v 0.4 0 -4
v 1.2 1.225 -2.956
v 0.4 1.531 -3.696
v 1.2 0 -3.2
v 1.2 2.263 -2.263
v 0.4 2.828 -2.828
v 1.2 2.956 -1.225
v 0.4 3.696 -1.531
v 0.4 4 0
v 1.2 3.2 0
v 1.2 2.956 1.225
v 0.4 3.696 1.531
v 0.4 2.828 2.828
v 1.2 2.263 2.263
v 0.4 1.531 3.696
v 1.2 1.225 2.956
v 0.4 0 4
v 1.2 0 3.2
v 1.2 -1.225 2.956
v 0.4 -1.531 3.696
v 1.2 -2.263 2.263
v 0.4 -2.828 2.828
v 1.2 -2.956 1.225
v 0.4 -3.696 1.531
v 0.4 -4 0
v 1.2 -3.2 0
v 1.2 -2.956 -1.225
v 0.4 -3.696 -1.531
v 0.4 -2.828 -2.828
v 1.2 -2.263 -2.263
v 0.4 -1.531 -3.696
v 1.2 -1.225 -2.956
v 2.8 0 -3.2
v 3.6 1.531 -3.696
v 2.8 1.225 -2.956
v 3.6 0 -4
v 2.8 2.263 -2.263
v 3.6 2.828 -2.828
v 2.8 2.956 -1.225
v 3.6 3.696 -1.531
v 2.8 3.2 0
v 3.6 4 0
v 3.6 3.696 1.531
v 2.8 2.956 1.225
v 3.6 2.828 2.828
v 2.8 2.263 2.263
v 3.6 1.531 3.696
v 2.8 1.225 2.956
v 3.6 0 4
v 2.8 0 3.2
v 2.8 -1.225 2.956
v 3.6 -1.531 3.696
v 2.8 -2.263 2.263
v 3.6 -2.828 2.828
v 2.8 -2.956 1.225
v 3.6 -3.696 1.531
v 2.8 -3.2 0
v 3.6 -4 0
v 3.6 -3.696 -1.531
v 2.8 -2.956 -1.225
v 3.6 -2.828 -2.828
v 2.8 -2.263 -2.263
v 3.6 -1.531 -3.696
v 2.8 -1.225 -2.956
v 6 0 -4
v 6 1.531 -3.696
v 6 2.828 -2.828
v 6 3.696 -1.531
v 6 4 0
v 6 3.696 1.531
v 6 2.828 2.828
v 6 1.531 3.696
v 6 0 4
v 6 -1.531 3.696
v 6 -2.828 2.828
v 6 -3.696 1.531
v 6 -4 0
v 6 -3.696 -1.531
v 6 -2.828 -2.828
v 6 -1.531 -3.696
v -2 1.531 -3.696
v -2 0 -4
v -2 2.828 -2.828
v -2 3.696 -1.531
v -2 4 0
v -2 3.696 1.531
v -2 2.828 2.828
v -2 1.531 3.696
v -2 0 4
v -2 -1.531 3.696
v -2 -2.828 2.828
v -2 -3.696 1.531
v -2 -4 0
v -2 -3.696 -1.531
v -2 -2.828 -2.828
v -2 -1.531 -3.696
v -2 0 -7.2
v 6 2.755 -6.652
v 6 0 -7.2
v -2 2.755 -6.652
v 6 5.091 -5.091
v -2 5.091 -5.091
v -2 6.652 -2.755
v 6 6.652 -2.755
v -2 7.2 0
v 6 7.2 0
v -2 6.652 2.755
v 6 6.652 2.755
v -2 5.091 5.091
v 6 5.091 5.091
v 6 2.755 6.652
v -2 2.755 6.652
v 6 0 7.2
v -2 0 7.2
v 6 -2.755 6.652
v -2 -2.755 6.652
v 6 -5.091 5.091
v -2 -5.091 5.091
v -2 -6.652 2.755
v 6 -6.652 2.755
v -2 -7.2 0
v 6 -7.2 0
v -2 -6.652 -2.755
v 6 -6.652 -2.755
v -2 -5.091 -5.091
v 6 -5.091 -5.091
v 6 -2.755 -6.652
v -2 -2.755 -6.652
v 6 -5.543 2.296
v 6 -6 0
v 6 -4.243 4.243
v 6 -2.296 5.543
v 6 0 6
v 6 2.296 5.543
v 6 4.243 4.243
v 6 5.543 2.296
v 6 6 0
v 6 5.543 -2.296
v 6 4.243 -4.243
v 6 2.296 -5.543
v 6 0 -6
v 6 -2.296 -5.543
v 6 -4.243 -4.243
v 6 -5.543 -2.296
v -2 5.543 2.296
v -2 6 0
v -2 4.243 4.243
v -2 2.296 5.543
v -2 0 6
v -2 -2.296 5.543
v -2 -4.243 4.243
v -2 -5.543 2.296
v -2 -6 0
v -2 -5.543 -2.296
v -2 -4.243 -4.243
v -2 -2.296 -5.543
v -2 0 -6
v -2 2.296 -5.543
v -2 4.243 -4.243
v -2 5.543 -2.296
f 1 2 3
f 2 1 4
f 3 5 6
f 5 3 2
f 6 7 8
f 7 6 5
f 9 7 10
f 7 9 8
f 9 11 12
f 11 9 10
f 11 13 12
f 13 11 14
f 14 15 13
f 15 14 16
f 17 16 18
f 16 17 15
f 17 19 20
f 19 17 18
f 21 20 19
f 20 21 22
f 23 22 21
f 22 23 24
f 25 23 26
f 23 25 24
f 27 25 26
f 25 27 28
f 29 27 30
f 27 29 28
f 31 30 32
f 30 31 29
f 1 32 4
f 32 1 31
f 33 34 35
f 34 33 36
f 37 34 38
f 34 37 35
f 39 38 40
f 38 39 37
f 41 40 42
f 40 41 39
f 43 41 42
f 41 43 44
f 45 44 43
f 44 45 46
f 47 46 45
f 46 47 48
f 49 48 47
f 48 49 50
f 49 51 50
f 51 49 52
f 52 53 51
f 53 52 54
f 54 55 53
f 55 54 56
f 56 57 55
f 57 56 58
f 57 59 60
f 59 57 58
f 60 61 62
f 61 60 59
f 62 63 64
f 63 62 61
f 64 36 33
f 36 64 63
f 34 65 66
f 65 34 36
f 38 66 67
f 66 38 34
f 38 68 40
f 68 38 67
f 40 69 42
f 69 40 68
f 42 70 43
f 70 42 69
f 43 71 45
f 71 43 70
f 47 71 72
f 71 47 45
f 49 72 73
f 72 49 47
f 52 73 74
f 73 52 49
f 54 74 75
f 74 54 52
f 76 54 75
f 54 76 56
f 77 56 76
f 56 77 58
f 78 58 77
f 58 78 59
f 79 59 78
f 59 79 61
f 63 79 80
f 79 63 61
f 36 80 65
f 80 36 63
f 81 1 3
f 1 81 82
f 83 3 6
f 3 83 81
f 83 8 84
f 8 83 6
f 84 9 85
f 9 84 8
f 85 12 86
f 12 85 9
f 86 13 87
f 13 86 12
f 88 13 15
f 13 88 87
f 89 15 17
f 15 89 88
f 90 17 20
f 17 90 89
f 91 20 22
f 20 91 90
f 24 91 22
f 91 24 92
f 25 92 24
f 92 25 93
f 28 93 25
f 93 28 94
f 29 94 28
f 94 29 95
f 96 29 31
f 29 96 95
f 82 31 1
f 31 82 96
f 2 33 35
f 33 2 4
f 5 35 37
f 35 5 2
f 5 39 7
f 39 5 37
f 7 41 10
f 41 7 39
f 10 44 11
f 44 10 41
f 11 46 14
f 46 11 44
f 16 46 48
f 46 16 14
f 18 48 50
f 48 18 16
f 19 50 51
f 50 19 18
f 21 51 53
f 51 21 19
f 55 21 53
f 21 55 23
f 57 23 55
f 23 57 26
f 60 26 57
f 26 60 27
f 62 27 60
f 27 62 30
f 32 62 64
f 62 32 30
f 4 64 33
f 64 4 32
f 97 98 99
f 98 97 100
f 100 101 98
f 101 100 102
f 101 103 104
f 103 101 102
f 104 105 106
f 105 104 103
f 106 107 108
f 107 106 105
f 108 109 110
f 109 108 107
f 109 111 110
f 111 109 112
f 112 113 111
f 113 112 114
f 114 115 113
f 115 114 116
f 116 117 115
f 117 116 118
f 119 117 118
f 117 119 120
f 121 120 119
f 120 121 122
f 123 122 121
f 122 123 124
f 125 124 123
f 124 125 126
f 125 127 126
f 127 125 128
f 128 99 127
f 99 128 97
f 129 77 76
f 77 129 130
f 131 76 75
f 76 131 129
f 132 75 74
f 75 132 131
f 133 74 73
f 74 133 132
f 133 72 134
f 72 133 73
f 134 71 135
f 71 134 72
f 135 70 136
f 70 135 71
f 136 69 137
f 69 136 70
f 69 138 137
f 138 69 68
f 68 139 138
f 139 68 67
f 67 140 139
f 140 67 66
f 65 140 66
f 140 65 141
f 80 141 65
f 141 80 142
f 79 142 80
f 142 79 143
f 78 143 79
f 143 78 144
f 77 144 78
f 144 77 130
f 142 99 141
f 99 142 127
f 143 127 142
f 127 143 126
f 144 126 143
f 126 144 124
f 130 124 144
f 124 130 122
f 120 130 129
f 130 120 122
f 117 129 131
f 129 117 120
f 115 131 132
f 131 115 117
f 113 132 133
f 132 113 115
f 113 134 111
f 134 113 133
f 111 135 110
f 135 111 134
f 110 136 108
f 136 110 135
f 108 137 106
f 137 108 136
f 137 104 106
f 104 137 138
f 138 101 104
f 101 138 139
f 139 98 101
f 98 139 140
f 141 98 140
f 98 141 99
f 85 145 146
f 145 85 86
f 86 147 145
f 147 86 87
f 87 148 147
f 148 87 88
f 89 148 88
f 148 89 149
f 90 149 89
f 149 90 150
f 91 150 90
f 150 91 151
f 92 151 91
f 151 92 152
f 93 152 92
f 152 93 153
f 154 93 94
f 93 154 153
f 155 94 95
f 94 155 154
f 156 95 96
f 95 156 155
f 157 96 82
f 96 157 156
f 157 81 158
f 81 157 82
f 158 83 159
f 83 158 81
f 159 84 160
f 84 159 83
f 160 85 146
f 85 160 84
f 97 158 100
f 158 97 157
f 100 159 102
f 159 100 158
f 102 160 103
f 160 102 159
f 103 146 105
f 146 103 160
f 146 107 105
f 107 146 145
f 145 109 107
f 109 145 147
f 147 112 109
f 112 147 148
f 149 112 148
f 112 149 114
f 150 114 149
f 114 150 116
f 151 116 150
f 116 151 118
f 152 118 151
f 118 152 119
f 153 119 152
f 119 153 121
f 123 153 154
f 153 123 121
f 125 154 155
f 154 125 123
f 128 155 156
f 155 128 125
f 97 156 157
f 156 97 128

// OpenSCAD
// file: ../p/4-4disc.scad
use <../lib.scad>
$fa=1; $fs=0.2;
function ldraw_lib__4_4disc(realsolid=false) = [
// 0 Disc 1.0
// 0 Name: 4-4disc.dat
// 0 Author: James Jessiman
// 0 !LDRAW_ORG Primitive UPDATE 2002-02
// 0 !LICENSE Licensed under CC BY 2.0 and CC BY 4.0 : see CAreadme.txt
// 
// 0 BFC CERTIFY CCW
  [0,"BFC","CERTIFY"],
  [0,"BFC","CCW"],
// 
// 0 !HISTORY 1998-12-15 [PTadmin] Official Update 1998-10
// 0 !HISTORY 2002-03-23 [sbliss] Added BFC statement
// 0 !HISTORY 2002-04-25 [PTadmin] Official Update 2002-02
// 0 !HISTORY 2007-06-24 [PTadmin] Header formatted for Contributor Agreement
// 0 !HISTORY 2008-07-01 [PTadmin] Official Update 2008-01
// 
// 
// 3 16 0 0 0 1 0 0 0.9239 0 0.3827
  [3,16,0,0,0,1,0,0,0.9239,0,0.3827],
// 3 16 0 0 0 0.9239 0 0.3827 0.7071 0 0.7071
  [3,16,0,0,0,0.9239,0,0.3827,0.7071,0,0.7071],
// 3 16 0 0 0 0.7071 0 0.7071 0.3827 0 0.9239
  [3,16,0,0,0,0.7071,0,0.7071,0.3827,0,0.9239],
// 3 16 0 0 0 0.3827 0 0.9239 0 0 1
  [3,16,0,0,0,0.3827,0,0.9239,0,0,1],
// 3 16 0 0 0 0 0 1 -0.3827 0 0.9239
  [3,16,0,0,0,0,0,1,-0.3827,0,0.9239],
// 3 16 0 0 0 -0.3827 0 0.9239 -0.7071 0 0.7071
  [3,16,0,0,0,-0.3827,0,0.9239,-0.7071,0,0.7071],
// 3 16 0 0 0 -0.7071 0 0.7071 -0.9239 0 0.3827
  [3,16,0,0,0,-0.7071,0,0.7071,-0.9239,0,0.3827],
// 3 16 0 0 0 -0.9239 0 0.3827 -1 0 -0
  [3,16,0,0,0,-0.9239,0,0.3827,-1,0,-0],
// 3 16 0 0 0 -1 0 -0 -0.9239 0 -0.3827
  [3,16,0,0,0,-1,0,-0,-0.9239,0,-0.3827],
// 3 16 0 0 0 -0.9239 0 -0.3827 -0.7071 0 -0.7071
  [3,16,0,0,0,-0.9239,0,-0.3827,-0.7071,0,-0.7071],
// 3 16 0 0 0 -0.7071 0 -0.7071 -0.3827 0 -0.9239
  [3,16,0,0,0,-0.7071,0,-0.7071,-0.3827,0,-0.9239],
// 3 16 0 0 0 -0.3827 0 -0.9239 0 0 -1
  [3,16,0,0,0,-0.3827,0,-0.9239,0,0,-1],
// 3 16 0 0 0 0 0 -1 0.3827 0 -0.9239
  [3,16,0,0,0,0,0,-1,0.3827,0,-0.9239],
// 3 16 0 0 0 0.3827 0 -0.9239 0.7071 0 -0.7071
  [3,16,0,0,0,0.3827,0,-0.9239,0.7071,0,-0.7071],
// 3 16 0 0 0 0.7071 0 -0.7071 0.9239 0 -0.3827
  [3,16,0,0,0,0.7071,0,-0.7071,0.9239,0,-0.3827],
// 3 16 0 0 0 0.9239 0 -0.3827 1 0 0
  [3,16,0,0,0,0.9239,0,-0.3827,1,0,0],
// 0
];
module ldraw_lib__4_4disc(step=0, col=false, unit=2/5, alt=false, line=0.2, solid=!$preview)
    makepoly(ldraw_lib__4_4disc(solid), step=step, col=col, unit=unit, alt=alt, line=line, solid=solid);
ldraw_lib__4_4disc(line=0.2);
// file: ../p/stud3.scad
use <../lib.scad>
use <4-4cyli.scad>
use <4-4disc.scad>
use <4-4edge.scad>
$fa=1; $fs=0.2;
function ldraw_lib__stud3(realsolid=false) = realsolid ? 
    [openscad(translate([0,0,-eps()], o=cylinder(4+eps(), r=4)),2)] : [
// 0 Stud Tube Solid
// 0 Name: stud3.dat
// 0 Author: James Jessiman
// 0 !LDRAW_ORG Primitive UPDATE 2012-01
// 0 !LICENSE Licensed under CC BY 2.0 and CC BY 4.0 : see CAreadme.txt
// 
// 0 BFC CERTIFY CCW
  [0,"BFC","CERTIFY"],
  [0,"BFC","CCW"],
// 
// 0 !HISTORY 2002-04-04 [sbliss] Modified for BFC compliance
// 0 !HISTORY 2002-04-25 [PTadmin] Official Update 2002-02
// 0 !HISTORY 2007-06-24 [PTadmin] Header formatted for Contributor Agreement
// 0 !HISTORY 2008-07-01 [PTadmin] Official Update 2008-01
// 0 !HISTORY 2012-02-16 [Philo] Changed to CCW
// 0 !HISTORY 2012-03-30 [PTadmin] Official Update 2012-01
// 
// 
// 1 16 0 -4 0 4 0 0 0 1 0 0 0 4 4-4edge.dat
  [1,16,0,-4,0,4,0,0,0,1,0,0,0,4, ldraw_lib__4_4edge(realsolid)],
// 1 16 0 0 0 4 0 0 0 1 0 0 0 4 4-4edge.dat
  [1,16,0,0,0,4,0,0,0,1,0,0,0,4, ldraw_lib__4_4edge(realsolid)],
// 1 16 0 -4 0 4 0 0 0 1 0 0 0 4 4-4disc.dat
  [1,16,0,-4,0,4,0,0,0,1,0,0,0,4, ldraw_lib__4_4disc(realsolid)],
// 1 16 0 -4 0 4 0 0 0 4 0 0 0 4 4-4cyli.dat
  [1,16,0,-4,0,4,0,0,0,4,0,0,0,4, ldraw_lib__4_4cyli(realsolid)],
];
module ldraw_lib__stud3(step=0, col=false, unit=2/5, alt=false, line=0.2, solid=!$preview)
    makepoly(ldraw_lib__stud3(solid), step=step, col=col, unit=unit, alt=alt, line=line, solid=solid);
ldraw_lib__stud3(line=0.2);
// file: ../p/stud.scad
use <../lib.scad>
use <4-4cyli.scad>
use <4-4disc.scad>
use <4-4edge.scad>
$fa=1; $fs=0.2;
function ldraw_lib__stud(realsolid=false) = realsolid ? 
    [openscad(translate([0,0,-eps()], o=cylinder(4+eps(), r=6)),2)] : [
// 0 Stud
// 0 Name: stud.dat
// 0 Author: James Jessiman
// 0 !LDRAW_ORG Primitive UPDATE 2012-01
// 0 !LICENSE Licensed under CC BY 2.0 and CC BY 4.0 : see CAreadme.txt
// 
// 0 BFC CERTIFY CCW
  [0,"BFC","CERTIFY"],
  [0,"BFC","CCW"],
// 
// 0 !HISTORY 2002-04-04 [sbliss] Modified for BFC compliance
// 0 !HISTORY 2002-04-25 [PTadmin] Official Update 2002-02
// 0 !HISTORY 2007-06-24 [PTadmin] Header formatted for Contributor Agreement
// 0 !HISTORY 2008-07-01 [PTadmin] Official Update 2008-01
// 0 !HISTORY 2012-02-16 [Philo] Changed to CCW
// 0 !HISTORY 2012-03-30 [PTadmin] Official Update 2012-01
// 
// 
// 1 16 0 0 0 6 0 0 0 1 0 0 0 6 4-4edge.dat
  [1,16,0,0,0,6,0,0,0,1,0,0,0,6, ldraw_lib__4_4edge(realsolid)],
// 1 16 0 -4 0 6 0 0 0 1 0 0 0 6 4-4edge.dat
  [1,16,0,-4,0,6,0,0,0,1,0,0,0,6, ldraw_lib__4_4edge(realsolid)],
// 1 16 0 0 0 6 0 0 0 -4 0 0 0 6 4-4cyli.dat
  [1,16,0,0,0,6,0,0,0,-4,0,0,0,6, ldraw_lib__4_4cyli(realsolid)],
// 1 16 0 -4 0 6 0 0 0 1 0 0 0 6 4-4disc.dat
  [1,16,0,-4,0,6,0,0,0,1,0,0,0,6, ldraw_lib__4_4disc(realsolid)],
];
module ldraw_lib__stud(step=0, col=false, unit=2/5, alt=false, line=0.2, solid=!$preview)
    makepoly(ldraw_lib__stud(solid), step=step, col=col, unit=unit, alt=alt, line=line, solid=solid);
ldraw_lib__stud(line=0.2);
// file: ../p/box5.scad
use <../lib.scad>
$fa=1; $fs=0.2;
function ldraw_lib__box5(realsolid=false) = [
// 0 Box with 5 Faces and All Edges
// 0 Name: box5.dat
// 0 Author: James Jessiman
// 0 !LDRAW_ORG Primitive UPDATE 2012-01
// 0 !LICENSE Licensed under CC BY 2.0 and CC BY 4.0 : see CAreadme.txt
// 
// 0 BFC CERTIFY CCW
  [0,"BFC","CERTIFY"],
  [0,"BFC","CCW"],
// 
// 0 !HISTORY 2002-04-03 [sbliss] Modified for BFC compliance
// 0 !HISTORY 2002-04-25 [PTadmin] Official Update 2002-02
// 0 !HISTORY 2007-06-24 [PTadmin] Header formatted for Contributor Agreement
// 0 !HISTORY 2008-07-01 [PTadmin] Official Update 2008-01
// 0 !HISTORY 2012-02-16 [Philo] Changed to CCW
// 0 !HISTORY 2012-03-30 [PTadmin] Official Update 2012-01
// 
// 
// 2 24 1 1 1 -1 1 1
  [2,24,1,1,1,-1,1,1],
// 2 24 -1 1 1 -1 1 -1
  [2,24,-1,1,1,-1,1,-1],
// 2 24 -1 1 -1 1 1 -1
  [2,24,-1,1,-1,1,1,-1],
// 2 24 1 1 -1 1 1 1
  [2,24,1,1,-1,1,1,1],
// 2 24 1 0 1 -1 0 1
  [2,24,1,0,1,-1,0,1],
// 2 24 -1 0 1 -1 0 -1
  [2,24,-1,0,1,-1,0,-1],
// 2 24 -1 0 -1 1 0 -1
  [2,24,-1,0,-1,1,0,-1],
// 2 24 1 0 -1 1 0 1
  [2,24,1,0,-1,1,0,1],
// 2 24 1 0 1 1 1 1
  [2,24,1,0,1,1,1,1],
// 2 24 -1 0 1 -1 1 1
  [2,24,-1,0,1,-1,1,1],
// 2 24 1 0 -1 1 1 -1
  [2,24,1,0,-1,1,1,-1],
// 2 24 -1 0 -1 -1 1 -1
  [2,24,-1,0,-1,-1,1,-1],
// 4 16 -1 1 1 1 1 1 1 1 -1 -1 1 -1
  [4,16,-1,1,1,1,1,1,1,1,-1,-1,1,-1],
// 4 16 -1 1 1 -1 0 1 1 0 1 1 1 1
  [4,16,-1,1,1,-1,0,1,1,0,1,1,1,1],
// 4 16 -1 1 -1 -1 0 -1 -1 0 1 -1 1 1
  [4,16,-1,1,-1,-1,0,-1,-1,0,1,-1,1,1],
// 4 16 1 1 -1 1 0 -1 -1 0 -1 -1 1 -1
  [4,16,1,1,-1,1,0,-1,-1,0,-1,-1,1,-1],
// 4 16 1 1 1 1 0 1 1 0 -1 1 1 -1
  [4,16,1,1,1,1,0,1,1,0,-1,1,1,-1],
];
module ldraw_lib__box5(step=0, col=false, unit=2/5, alt=false, line=0.2, solid=!$preview)
    makepoly(ldraw_lib__box5(solid), step=step, col=col, unit=unit, alt=alt, line=line, solid=solid);
ldraw_lib__box5(line=0.2);
// file: ../p/box4t.scad
use <../lib.scad>
$fa=1; $fs=0.2;
function ldraw_lib__box4t(realsolid=false) = [
// 0 Box with 4 Adjacent Faces and All Edges
// 0 Name: box4t.dat
// 0 Author: Tore Eriksson [Tore_Eriksson]
// 0 !LDRAW_ORG Primitive UPDATE 2003-02
// 0 !LICENSE Licensed under CC BY 2.0 and CC BY 4.0 : see CAreadme.txt
// 
// 0 BFC CERTIFY CCW
  [0,"BFC","CERTIFY"],
  [0,"BFC","CCW"],
// 
// 0 !HISTORY 1997-09-29 [PTadmin] Official Update 1997-15
// 0 !HISTORY 2002-08-31 [izanette] Modified with WINDZ for BFC compliance
// 0 !HISTORY 2003-08-01 [PTadmin] Official Update 2003-02
// 0 !HISTORY 2007-06-24 [PTadmin] Header formatted for Contributor Agreement
// 0 !HISTORY 2008-07-01 [PTadmin] Official Update 2008-01
// 
// 
// 2 24 1 1 1 -1 1 1
  [2,24,1,1,1,-1,1,1],
// 2 24 -1 1 1 -1 1 -1
  [2,24,-1,1,1,-1,1,-1],
// 2 24 -1 1 -1 1 1 -1
  [2,24,-1,1,-1,1,1,-1],
// 2 24 1 1 -1 1 1 1
  [2,24,1,1,-1,1,1,1],
// 2 24 1 0 1 -1 0 1
  [2,24,1,0,1,-1,0,1],
// 2 24 -1 0 1 -1 0 -1
  [2,24,-1,0,1,-1,0,-1],
// 2 24 -1 0 -1 1 0 -1
  [2,24,-1,0,-1,1,0,-1],
// 2 24 1 0 -1 1 0 1
  [2,24,1,0,-1,1,0,1],
// 2 24 1 0 1 1 1 1
  [2,24,1,0,1,1,1,1],
// 2 24 -1 0 1 -1 1 1
  [2,24,-1,0,1,-1,1,1],
// 2 24 1 0 -1 1 1 -1
  [2,24,1,0,-1,1,1,-1],
// 2 24 -1 0 -1 -1 1 -1
  [2,24,-1,0,-1,-1,1,-1],
// 4 16 1 1 1 1 1 -1 -1 1 -1 -1 1 1
  [4,16,1,1,1,1,1,-1,-1,1,-1,-1,1,1],
// 4 16 1 1 1 -1 1 1 -1 0 1 1 0 1
  [4,16,1,1,1,-1,1,1,-1,0,1,1,0,1],
// 4 16 -1 1 1 -1 1 -1 -1 0 -1 -1 0 1
  [4,16,-1,1,1,-1,1,-1,-1,0,-1,-1,0,1],
// 0 4 16 -1 1 -1 -1 0 -1 1 0 -1 1 1 -1
// 4 16 1 1 -1 1 1 1 1 0 1 1 0 -1
  [4,16,1,1,-1,1,1,1,1,0,1,1,0,-1],
// 0
];
module ldraw_lib__box4t(step=0, col=false, unit=2/5, alt=false, line=0.2, solid=!$preview)
    makepoly(ldraw_lib__box4t(solid), step=step, col=col, unit=unit, alt=alt, line=line, solid=solid);
ldraw_lib__box4t(line=0.2);
// file: s/3004s01.scad
use <../../lib.scad>
use <../../p/box4t.scad>
use <../../p/box5.scad>
use <../../p/stud.scad>
use <../../p/stud3.scad>
$fa=1; $fs=0.2;
function ldraw_lib__s__3004s01(realsolid=false) = [
// 0 ~Brick  1 x  2 without Front Face
// 0 Name: s\3004s01.dat
// 0 Author: James Jessiman
// 0 !LDRAW_ORG Subpart UPDATE 2003-03
// 0 !LICENSE Licensed under CC BY 2.0 and CC BY 4.0 : see CAreadme.txt
// 
// 0 BFC CERTIFY CCW
  [0,"BFC","CERTIFY"],
  [0,"BFC","CCW"],
// 
// 0 !HISTORY 2003-09-07 [jriley] Subfiling, BFC
// 0 !HISTORY 2003-12-19 [PTadmin] Official Update 2003-03
// 0 !HISTORY 2007-08-29 [PTadmin] Header formatted for Contributor Agreement
// 0 !HISTORY 2008-07-01 [PTadmin] Official Update 2008-01
// 
// 
// 1 16 0 4 0 1 0 0 0 -5 0 0 0 1 stud3.dat
  [1,16,0,4,0,1,0,0,0,-5,0,0,0,1, ldraw_lib__stud3(realsolid)],
// 0 BFC INVERTNEXT
  [0,"BFC","INVERTNEXT"],
// 1 16 0 24 0 16 0 0 0 -20 0 0 0 6 box5.dat
  [1,16,0,24,0,16,0,0,0,-20,0,0,0,6, ldraw_lib__box5(realsolid)],
// 4 16 20 24 10 16 24 6 -16 24 6 -20 24 10
  [4,16,20,24,10,16,24,6,-16,24,6,-20,24,10],
// 4 16 -20 24 10 -16 24 6 -16 24 -6 -20 24 -10
  [4,16,-20,24,10,-16,24,6,-16,24,-6,-20,24,-10],
// 4 16 -20 24 -10 -16 24 -6 16 24 -6 20 24 -10
  [4,16,-20,24,-10,-16,24,-6,16,24,-6,20,24,-10],
// 4 16 20 24 -10 16 24 -6 16 24 6 20 24 10
  [4,16,20,24,-10,16,24,-6,16,24,6,20,24,10],
// 1 16 0 24 0 20 0 0 0 -24 0 0 0 10 box4t.dat
  [1,16,0,24,0,20,0,0,0,-24,0,0,0,10, ldraw_lib__box4t(realsolid)],
// 1 16 10 0 0 1 0 0 0 1 0 0 0 1 stud.dat
  [1,16,10,0,0,1,0,0,0,1,0,0,0,1, ldraw_lib__stud(realsolid)],
// 1 16 -10 0 0 1 0 0 0 1 0 0 0 1 stud.dat
  [1,16,-10,0,0,1,0,0,0,1,0,0,0,1, ldraw_lib__stud(realsolid)],
// 0
];
module ldraw_lib__s__3004s01(step=0, col=false, unit=2/5, alt=false, line=0.2, solid=!$preview)
    makepoly(ldraw_lib__s__3004s01(solid), step=step, col=col, unit=unit, alt=alt, line=line, solid=solid);
ldraw_lib__s__3004s01(line=0.2);
// file: 3004.scad
use <../lib.scad>
use <s/3004s01.scad>
$fa=1; $fs=0.2;
function ldraw_lib__3004(realsolid=false) = [
// 0 Brick  1 x  2
// 0 Name: 3004.dat
// 0 Author: James Jessiman
// 0 !LDRAW_ORG Part UPDATE 2022-05
// 0 !LICENSE Licensed under CC BY 2.0 and CC BY 4.0 : see CAreadme.txt
// 
// 0 BFC CERTIFY CCW
  [0,"BFC","CERTIFY"],
  [0,"BFC","CCW"],
// 
// 0 !HISTORY 2001-10-26 [PTadmin] Official Update 2001-01
// 0 !HISTORY 2002-05-07 {unknown} BFC Certification
// 0 !HISTORY 2002-06-11 [PTadmin] Official Update 2002-03
// 0 !HISTORY 2007-05-07 [PTadmin] Header formatted for Contributor Agreement
// 0 !HISTORY 2008-07-01 [PTadmin] Official Update 2008-01
// 0 !HISTORY 2022-08-04 [MagFors] Using subfile
// 0 !HISTORY 2022-09-15 [PTadmin] Official Update 2022-05
// 
// 
// 1 16 0 0 0 1 0 0 0 1 0 0 0 1 s\3004s01.dat
  [1,16,0,0,0,1,0,0,0,1,0,0,0,1, ldraw_lib__s__3004s01(realsolid)],
// 4 16 -20 24 -10 20 24 -10 20 0 -10 -20 0 -10
  [4,16,-20,24,-10,20,24,-10,20,0,-10,-20,0,-10],
];
module ldraw_lib__3004(step=0, col=false, unit=2/5, alt=false, line=0.2, solid=!$preview)
    makepoly(ldraw_lib__3004(solid), step=step, col=col, unit=unit, alt=alt, line=line, solid=solid);
ldraw_lib__3004(line=0.2);
// file: ../p/4-4ring5.scad
use <../lib.scad>
$fa=1; $fs=0.2;
function ldraw_lib__4_4ring5(realsolid=false) = [
// 0 Ring  5 x 1.0
// 0 Name: 4-4ring5.dat
// 0 Author: Mark Kennedy [mkennedy]
// 0 !LDRAW_ORG Primitive UPDATE 2012-01
// 0 !LICENSE Licensed under CC BY 2.0 and CC BY 4.0 : see CAreadme.txt
// 
// 0 BFC CERTIFY CCW
  [0,"BFC","CERTIFY"],
  [0,"BFC","CCW"],
// 
// 0 !HISTORY 2001-10-23 [pneaster] resequenced quads, corrected winding.
// 0 !HISTORY 2001-12-29 [pneaster] Added BFC.
// 0 !HISTORY 2002-04-25 [PTadmin] Official Update 2002-02
// 0 !HISTORY 2007-06-24 [PTadmin] Header formatted for Contributor Agreement
// 0 !HISTORY 2008-07-01 [PTadmin] Official Update 2008-01
// 0 !HISTORY 2012-02-16 [Philo] Changed to CCW
// 0 !HISTORY 2012-03-30 [PTadmin] Official Update 2012-01
// 
// 
// 4 16 6 0 0 5.5433 0 2.2961 4.6195 0 1.9135 5 0 0
  [4,16,6,0,0,5.5433,0,2.2961,4.6195,0,1.9135,5,0,0],
// 4 16 5.5433 0 2.2961 4.2426 0 4.2426 3.5355 0 3.5355 4.6195 0 1.9135
  [4,16,5.5433,0,2.2961,4.2426,0,4.2426,3.5355,0,3.5355,4.6195,0,1.9135],
// 4 16 4.2426 0 4.2426 2.2961 0 5.5433 1.9135 0 4.6195 3.5355 0 3.5355
  [4,16,4.2426,0,4.2426,2.2961,0,5.5433,1.9135,0,4.6195,3.5355,0,3.5355],
// 4 16 2.2961 0 5.5433 0 0 6 0 0 5 1.9135 0 4.6195
  [4,16,2.2961,0,5.5433,0,0,6,0,0,5,1.9135,0,4.6195],
// 4 16 0 0 6 -2.2961 0 5.5433 -1.9135 0 4.6195 0 0 5
  [4,16,0,0,6,-2.2961,0,5.5433,-1.9135,0,4.6195,0,0,5],
// 4 16 -2.2961 0 5.5433 -4.2426 0 4.2426 -3.5355 0 3.5355 -1.9135 0 4.6195
  [4,16,-2.2961,0,5.5433,-4.2426,0,4.2426,-3.5355,0,3.5355,-1.9135,0,4.6195],
// 4 16 -4.2426 0 4.2426 -5.5433 0 2.2961 -4.6195 0 1.9135 -3.5355 0 3.5355
  [4,16,-4.2426,0,4.2426,-5.5433,0,2.2961,-4.6195,0,1.9135,-3.5355,0,3.5355],
// 4 16 -5.5433 0 2.2961 -6 0 0 -5 0 0 -4.6195 0 1.9135
  [4,16,-5.5433,0,2.2961,-6,0,0,-5,0,0,-4.6195,0,1.9135],
// 4 16 -6 0 0 -5.5433 0 -2.2961 -4.6195 0 -1.9135 -5 0 0
  [4,16,-6,0,0,-5.5433,0,-2.2961,-4.6195,0,-1.9135,-5,0,0],
// 4 16 -5.5433 0 -2.2961 -4.2426 0 -4.2426 -3.5355 0 -3.5355 -4.6195 0 -1.9135
  [4,16,-5.5433,0,-2.2961,-4.2426,0,-4.2426,-3.5355,0,-3.5355,-4.6195,0,-1.9135],
// 4 16 -4.2426 0 -4.2426 -2.2961 0 -5.5433 -1.9135 0 -4.6195 -3.5355 0 -3.5355
  [4,16,-4.2426,0,-4.2426,-2.2961,0,-5.5433,-1.9135,0,-4.6195,-3.5355,0,-3.5355],
// 4 16 -2.2961 0 -5.5433 0 0 -6 0 0 -5 -1.9135 0 -4.6195
  [4,16,-2.2961,0,-5.5433,0,0,-6,0,0,-5,-1.9135,0,-4.6195],
// 4 16 0 0 -6 2.2961 0 -5.5433 1.9135 0 -4.6195 0 0 -5
  [4,16,0,0,-6,2.2961,0,-5.5433,1.9135,0,-4.6195,0,0,-5],
// 4 16 2.2961 0 -5.5433 4.2426 0 -4.2426 3.5355 0 -3.5355 1.9135 0 -4.6195
  [4,16,2.2961,0,-5.5433,4.2426,0,-4.2426,3.5355,0,-3.5355,1.9135,0,-4.6195],
// 4 16 4.2426 0 -4.2426 5.5433 0 -2.2961 4.6195 0 -1.9135 3.5355 0 -3.5355
  [4,16,4.2426,0,-4.2426,5.5433,0,-2.2961,4.6195,0,-1.9135,3.5355,0,-3.5355],
// 4 16 5.5433 0 -2.2961 6 0 0 5 0 0 4.6195 0 -1.9135
  [4,16,5.5433,0,-2.2961,6,0,0,5,0,0,4.6195,0,-1.9135],
];
module ldraw_lib__4_4ring5(step=0, col=false, unit=2/5, alt=false, line=0.2, solid=!$preview)
    makepoly(ldraw_lib__4_4ring5(solid), step=step, col=col, unit=unit, alt=alt, line=line, solid=solid);
ldraw_lib__4_4ring5(line=0.2);
// file: ../p/4-4ring2.scad
use <../lib.scad>
$fa=1; $fs=0.2;
function ldraw_lib__4_4ring2(realsolid=false) = [
// 0 Ring  2 x 1.0
// 0 Name: 4-4ring2.dat
// 0 Author: James Jessiman
// 0 !LDRAW_ORG Primitive UPDATE 2009-01
// 0 !LICENSE Licensed under CC BY 2.0 and CC BY 4.0 : see CAreadme.txt
// 
// 0 BFC CERTIFY CCW
  [0,"BFC","CERTIFY"],
  [0,"BFC","CCW"],
// 
// 0 !HISTORY 1998-12-15 [PTadmin] Official Update 1998-10
// 0 !HISTORY 2002-04-05 [hafhead] Added BFC statement
// 0 !HISTORY 2002-04-25 [PTadmin] Official Update 2002-02
// 0 !HISTORY 2007-06-24 [PTadmin] Header formatted for Contributor Agreement
// 0 !HISTORY 2008-07-01 [PTadmin] Official Update 2008-01
// 0 !HISTORY 2008-08-26 [cwdee] Switch polygon winding and rename
// 0 !HISTORY 2009-05-02 [PTadmin] Official Update 2009-01
// 
// 
// 4 16 -1.1481 0 2.7717 -0.7654 0 1.8478 0 0 2 0 0 3
  [4,16,-1.1481,0,2.7717,-0.7654,0,1.8478,0,0,2,0,0,3],
// 4 16 -2.1213 0 2.1213 -1.4142 0 1.4142 -0.7654 0 1.8478 -1.1481 0 2.7717
  [4,16,-2.1213,0,2.1213,-1.4142,0,1.4142,-0.7654,0,1.8478,-1.1481,0,2.7717],
// 4 16 -2.7717 0 1.1481 -1.8478 0 0.7654 -1.4142 0 1.4142 -2.1213 0 2.1213
  [4,16,-2.7717,0,1.1481,-1.8478,0,0.7654,-1.4142,0,1.4142,-2.1213,0,2.1213],
// 4 16 -3 0 0 -2 0 0 -1.8478 0 0.7654 -2.7717 0 1.1481
  [4,16,-3,0,0,-2,0,0,-1.8478,0,0.7654,-2.7717,0,1.1481],
// 4 16 -2.7717 0 -1.1481 -1.8478 0 -0.7654 -2 0 0 -3 0 0
  [4,16,-2.7717,0,-1.1481,-1.8478,0,-0.7654,-2,0,0,-3,0,0],
// 4 16 -2.1213 0 -2.1213 -1.4142 0 -1.4142 -1.8478 0 -0.7654 -2.7717 0 -1.1481
  [4,16,-2.1213,0,-2.1213,-1.4142,0,-1.4142,-1.8478,0,-0.7654,-2.7717,0,-1.1481],
// 4 16 -1.1481 0 -2.7717 -0.7654 0 -1.8478 -1.4142 0 -1.4142 -2.1213 0 -2.1213
  [4,16,-1.1481,0,-2.7717,-0.7654,0,-1.8478,-1.4142,0,-1.4142,-2.1213,0,-2.1213],
// 4 16 0 0 -3 0 0 -2 -0.7654 0 -1.8478 -1.1481 0 -2.7717
  [4,16,0,0,-3,0,0,-2,-0.7654,0,-1.8478,-1.1481,0,-2.7717],
// 4 16 1.1481 0 -2.7717 0.7654 0 -1.8478 0 0 -2 0 0 -3
  [4,16,1.1481,0,-2.7717,0.7654,0,-1.8478,0,0,-2,0,0,-3],
// 4 16 2.1213 0 -2.1213 1.4142 0 -1.4142 0.7654 0 -1.8478 1.1481 0 -2.7717
  [4,16,2.1213,0,-2.1213,1.4142,0,-1.4142,0.7654,0,-1.8478,1.1481,0,-2.7717],
// 4 16 2.7717 0 -1.1481 1.8478 0 -0.7654 1.4142 0 -1.4142 2.1213 0 -2.1213
  [4,16,2.7717,0,-1.1481,1.8478,0,-0.7654,1.4142,0,-1.4142,2.1213,0,-2.1213],
// 4 16 3 0 0 2 0 0 1.8478 0 -0.7654 2.7717 0 -1.1481
  [4,16,3,0,0,2,0,0,1.8478,0,-0.7654,2.7717,0,-1.1481],
// 4 16 2.7717 0 1.1481 1.8478 0 0.7654 2 0 0 3 0 0
  [4,16,2.7717,0,1.1481,1.8478,0,0.7654,2,0,0,3,0,0],
// 4 16 2.1213 0 2.1213 1.4142 0 1.4142 1.8478 0 0.7654 2.7717 0 1.1481
  [4,16,2.1213,0,2.1213,1.4142,0,1.4142,1.8478,0,0.7654,2.7717,0,1.1481],
// 4 16 1.1481 0 2.7717 0.7654 0 1.8478 1.4142 0 1.4142 2.1213 0 2.1213
  [4,16,1.1481,0,2.7717,0.7654,0,1.8478,1.4142,0,1.4142,2.1213,0,2.1213],
// 4 16 0 0 3 0 0 2 0.7654 0 1.8478 1.1481 0 2.7717
  [4,16,0,0,3,0,0,2,0.7654,0,1.8478,1.1481,0,2.7717],
// 0
];
module ldraw_lib__4_4ring2(step=0, col=false, unit=2/5, alt=false, line=0.2, solid=!$preview)
    makepoly(ldraw_lib__4_4ring2(solid), step=step, col=col, unit=unit, alt=alt, line=line, solid=solid);
ldraw_lib__4_4ring2(line=0.2);
// file: ../p/4-4edge.scad
use <../lib.scad>
$fa=1; $fs=0.2;
function ldraw_lib__4_4edge(realsolid=false) = [
// 0 Circle 1.0
// 0 Name: 4-4edge.dat
// 0 Author: James Jessiman
// 0 !LDRAW_ORG Primitive UPDATE 2017-01
// 0 !LICENSE Licensed under CC BY 2.0 and CC BY 4.0 : see CAreadme.txt
// 
// 0 BFC CERTIFY CCW
  [0,"BFC","CERTIFY"],
  [0,"BFC","CCW"],
// 
// 0 !HISTORY 1998-12-15 [PTadmin] Official Update 1998-10
// 0 !HISTORY 2005-12-28 [PTadmin] Official Update 2005-01
// 0 !HISTORY 2007-06-24 [PTadmin] Header formatted for Contributor Agreement
// 0 !HISTORY 2008-07-01 [PTadmin] Official Update 2008-01
// 0 !HISTORY 2017-01-15 [Steffen] BFCed
// 0 !HISTORY 2017-12-30 [PTadmin] Official Update 2017-01
// 
// 
// 2 24 1 0 0 0.9239 0 0.3827
  [2,24,1,0,0,0.9239,0,0.3827],
// 2 24 0.9239 0 0.3827 0.7071 0 0.7071
  [2,24,0.9239,0,0.3827,0.7071,0,0.7071],
// 2 24 0.7071 0 0.7071 0.3827 0 0.9239
  [2,24,0.7071,0,0.7071,0.3827,0,0.9239],
// 2 24 0.3827 0 0.9239 0 0 1
  [2,24,0.3827,0,0.9239,0,0,1],
// 2 24 0 0 1 -0.3827 0 0.9239
  [2,24,0,0,1,-0.3827,0,0.9239],
// 2 24 -0.3827 0 0.9239 -0.7071 0 0.7071
  [2,24,-0.3827,0,0.9239,-0.7071,0,0.7071],
// 2 24 -0.7071 0 0.7071 -0.9239 0 0.3827
  [2,24,-0.7071,0,0.7071,-0.9239,0,0.3827],
// 2 24 -0.9239 0 0.3827 -1 0 -0
  [2,24,-0.9239,0,0.3827,-1,0,-0],
// 2 24 -1 0 -0 -0.9239 0 -0.3827
  [2,24,-1,0,-0,-0.9239,0,-0.3827],
// 2 24 -0.9239 0 -0.3827 -0.7071 0 -0.7071
  [2,24,-0.9239,0,-0.3827,-0.7071,0,-0.7071],
// 2 24 -0.7071 0 -0.7071 -0.3827 0 -0.9239
  [2,24,-0.7071,0,-0.7071,-0.3827,0,-0.9239],
// 2 24 -0.3827 0 -0.9239 0 0 -1
  [2,24,-0.3827,0,-0.9239,0,0,-1],
// 2 24 0 0 -1 0.3827 0 -0.9239
  [2,24,0,0,-1,0.3827,0,-0.9239],
// 2 24 0.3827 0 -0.9239 0.7071 0 -0.7071
  [2,24,0.3827,0,-0.9239,0.7071,0,-0.7071],
// 2 24 0.7071 0 -0.7071 0.9239 0 -0.3827
  [2,24,0.7071,0,-0.7071,0.9239,0,-0.3827],
// 2 24 0.9239 0 -0.3827 1 0 0
  [2,24,0.9239,0,-0.3827,1,0,0],
];
module ldraw_lib__4_4edge(step=0, col=false, unit=2/5, alt=false, line=0.2, solid=!$preview)
    makepoly(ldraw_lib__4_4edge(solid), step=step, col=col, unit=unit, alt=alt, line=line, solid=solid);
ldraw_lib__4_4edge(line=0.2);
// file: ../p/4-4cyli.scad
use <../lib.scad>
$fa=1; $fs=0.2;
function ldraw_lib__4_4cyli(realsolid=false) = [
// 0 Cylinder 1.0
// 0 Name: 4-4cyli.dat
// 0 Author: James Jessiman
// 0 !LDRAW_ORG Primitive UPDATE 2005-01
// 0 !LICENSE Licensed under CC BY 2.0 and CC BY 4.0 : see CAreadme.txt
// 
// 0 BFC CERTIFY CCW
  [0,"BFC","CERTIFY"],
  [0,"BFC","CCW"],
// 
// 0 !HISTORY 1998-12-15 [PTadmin] Official Update 1998-10
// 0 !HISTORY 2002-03-23 [sbliss] Added BFC statement; merged headers from files in distributions LDraw 0.27 and Complete.
// 0 !HISTORY 2002-04-25 [PTadmin] Official Update 2002-02
// 0 !HISTORY 2004-12-14 [guyvivan] BFC CCW
// 0 !HISTORY 2005-12-28 [PTadmin] Official Update 2005-01
// 0 !HISTORY 2007-06-24 [PTadmin] Header formatted for Contributor Agreement
// 0 !HISTORY 2008-07-01 [PTadmin] Official Update 2008-01
// 
// 
// 4 16 1 1 0 0.9239 1 0.3827 0.9239 0 0.3827 1 0 0
  [4,16,1,1,0,0.9239,1,0.3827,0.9239,0,0.3827,1,0,0],
// 5 24 1 0 0 1 1 0 0.9239 0 0.3827 0.9239 0 -0.3827
  [5,24,1,0,0,1,1,0,0.9239,0,0.3827,0.9239,0,-0.3827],
// 4 16 0.9239 1 0.3827 0.7071 1 0.7071 0.7071 0 0.7071 0.9239 0 0.3827
  [4,16,0.9239,1,0.3827,0.7071,1,0.7071,0.7071,0,0.7071,0.9239,0,0.3827],
// 5 24 0.9239 0 0.3827 0.9239 1 0.3827 0.7071 0 0.7071 1 0 0
  [5,24,0.9239,0,0.3827,0.9239,1,0.3827,0.7071,0,0.7071,1,0,0],
// 4 16 0.7071 1 0.7071 0.3827 1 0.9239 0.3827 0 0.9239 0.7071 0 0.7071
  [4,16,0.7071,1,0.7071,0.3827,1,0.9239,0.3827,0,0.9239,0.7071,0,0.7071],
// 5 24 0.7071 0 0.7071 0.7071 1 0.7071 0.3827 0 0.9239 0.9239 0 0.3827
  [5,24,0.7071,0,0.7071,0.7071,1,0.7071,0.3827,0,0.9239,0.9239,0,0.3827],
// 4 16 0.3827 1 0.9239 0 1 1 0 0 1 0.3827 0 0.9239
  [4,16,0.3827,1,0.9239,0,1,1,0,0,1,0.3827,0,0.9239],
// 5 24 0.3827 0 0.9239 0.3827 1 0.9239 0 0 1 0.7071 0 0.7071
  [5,24,0.3827,0,0.9239,0.3827,1,0.9239,0,0,1,0.7071,0,0.7071],
// 4 16 0 1 1 -0.3827 1 0.9239 -0.3827 0 0.9239 0 0 1
  [4,16,0,1,1,-0.3827,1,0.9239,-0.3827,0,0.9239,0,0,1],
// 5 24 0 0 1 0 1 1 -0.3827 0 0.9239 0.3827 0 0.9239
  [5,24,0,0,1,0,1,1,-0.3827,0,0.9239,0.3827,0,0.9239],
// 4 16 -0.3827 1 0.9239 -0.7071 1 0.7071 -0.7071 0 0.7071 -0.3827 0 0.9239
  [4,16,-0.3827,1,0.9239,-0.7071,1,0.7071,-0.7071,0,0.7071,-0.3827,0,0.9239],
// 5 24 -0.3827 0 0.9239 -0.3827 1 0.9239 -0.7071 0 0.7071 0 0 1
  [5,24,-0.3827,0,0.9239,-0.3827,1,0.9239,-0.7071,0,0.7071,0,0,1],
// 4 16 -0.7071 1 0.7071 -0.9239 1 0.3827 -0.9239 0 0.3827 -0.7071 0 0.7071
  [4,16,-0.7071,1,0.7071,-0.9239,1,0.3827,-0.9239,0,0.3827,-0.7071,0,0.7071],
// 5 24 -0.7071 0 0.7071 -0.7071 1 0.7071 -0.9239 0 0.3827 -0.3827 0 0.9239
  [5,24,-0.7071,0,0.7071,-0.7071,1,0.7071,-0.9239,0,0.3827,-0.3827,0,0.9239],
// 4 16 -0.9239 1 0.3827 -1 1 0 -1 0 0 -0.9239 0 0.3827
  [4,16,-0.9239,1,0.3827,-1,1,0,-1,0,0,-0.9239,0,0.3827],
// 5 24 -0.9239 0 0.3827 -0.9239 1 0.3827 -1 0 0 -0.7071 0 0.7071
  [5,24,-0.9239,0,0.3827,-0.9239,1,0.3827,-1,0,0,-0.7071,0,0.7071],
// 4 16 -1 1 0 -0.9239 1 -0.3827 -0.9239 0 -0.3827 -1 0 0
  [4,16,-1,1,0,-0.9239,1,-0.3827,-0.9239,0,-0.3827,-1,0,0],
// 5 24 -1 0 0 -1 1 0 -0.9239 0 -0.3827 -0.9239 0 0.3827
  [5,24,-1,0,0,-1,1,0,-0.9239,0,-0.3827,-0.9239,0,0.3827],
// 4 16 -0.9239 1 -0.3827 -0.7071 1 -0.7071 -0.7071 0 -0.7071 -0.9239 0 -0.3827
  [4,16,-0.9239,1,-0.3827,-0.7071,1,-0.7071,-0.7071,0,-0.7071,-0.9239,0,-0.3827],
// 5 24 -0.9239 0 -0.3827 -0.9239 1 -0.3827 -0.7071 0 -0.7071 -1 0 0
  [5,24,-0.9239,0,-0.3827,-0.9239,1,-0.3827,-0.7071,0,-0.7071,-1,0,0],
// 4 16 -0.7071 1 -0.7071 -0.3827 1 -0.9239 -0.3827 0 -0.9239 -0.7071 0 -0.7071
  [4,16,-0.7071,1,-0.7071,-0.3827,1,-0.9239,-0.3827,0,-0.9239,-0.7071,0,-0.7071],
// 5 24 -0.7071 0 -0.7071 -0.7071 1 -0.7071 -0.3827 0 -0.9239 -0.9239 0 -0.3827
  [5,24,-0.7071,0,-0.7071,-0.7071,1,-0.7071,-0.3827,0,-0.9239,-0.9239,0,-0.3827],
// 4 16 -0.3827 1 -0.9239 0 1 -1 0 0 -1 -0.3827 0 -0.9239
  [4,16,-0.3827,1,-0.9239,0,1,-1,0,0,-1,-0.3827,0,-0.9239],
// 5 24 -0.3827 0 -0.9239 -0.3827 1 -0.9239 0 0 -1 -0.7071 0 -0.7071
  [5,24,-0.3827,0,-0.9239,-0.3827,1,-0.9239,0,0,-1,-0.7071,0,-0.7071],
// 4 16 0 1 -1 0.3827 1 -0.9239 0.3827 0 -0.9239 0 0 -1
  [4,16,0,1,-1,0.3827,1,-0.9239,0.3827,0,-0.9239,0,0,-1],
// 5 24 0 0 -1 0 1 -1 0.3827 0 -0.9239 -0.3827 0 -0.9239
  [5,24,0,0,-1,0,1,-1,0.3827,0,-0.9239,-0.3827,0,-0.9239],
// 4 16 0.3827 1 -0.9239 0.7071 1 -0.7071 0.7071 0 -0.7071 0.3827 0 -0.9239
  [4,16,0.3827,1,-0.9239,0.7071,1,-0.7071,0.7071,0,-0.7071,0.3827,0,-0.9239],
// 5 24 0.3827 0 -0.9239 0.3827 1 -0.9239 0.7071 0 -0.7071 0 0 -1
  [5,24,0.3827,0,-0.9239,0.3827,1,-0.9239,0.7071,0,-0.7071,0,0,-1],
// 4 16 0.7071 1 -0.7071 0.9239 1 -0.3827 0.9239 0 -0.3827 0.7071 0 -0.7071
  [4,16,0.7071,1,-0.7071,0.9239,1,-0.3827,0.9239,0,-0.3827,0.7071,0,-0.7071],
// 5 24 0.7071 0 -0.7071 0.7071 1 -0.7071 0.9239 0 -0.3827 0.3827 0 -0.9239
  [5,24,0.7071,0,-0.7071,0.7071,1,-0.7071,0.9239,0,-0.3827,0.3827,0,-0.9239],
// 4 16 0.9239 1 -0.3827 1 1 0 1 0 0 0.9239 0 -0.3827
  [4,16,0.9239,1,-0.3827,1,1,0,1,0,0,0.9239,0,-0.3827],
// 5 24 0.9239 0 -0.3827 0.9239 1 -0.3827 1 0 0 0.7071 0 -0.7071
  [5,24,0.9239,0,-0.3827,0.9239,1,-0.3827,1,0,0,0.7071,0,-0.7071],
// 0
];
module ldraw_lib__4_4cyli(step=0, col=false, unit=2/5, alt=false, line=0.2, solid=!$preview)
    makepoly(ldraw_lib__4_4cyli(solid), step=step, col=col, unit=unit, alt=alt, line=line, solid=solid);
ldraw_lib__4_4cyli(line=0.2);
// file: ../p/4-4con4.scad
use <../lib.scad>
$fa=1; $fs=0.2;
function ldraw_lib__4_4con4(realsolid=false) = [
// 0 Cone  4 x 1.0
// 0 Name: 4-4con4.dat
// 0 Author: John Riley [jriley]
// 0 !LDRAW_ORG Primitive UPDATE 2012-01
// 0 !LICENSE Licensed under CC BY 2.0 and CC BY 4.0 : see CAreadme.txt
// 
// 0 BFC CERTIFY CCW
  [0,"BFC","CERTIFY"],
  [0,"BFC","CCW"],
// 
// 0 !HISTORY 2003-08-01 [PTadmin] Official Update 2003-02
// 0 !HISTORY 2007-06-24 [PTadmin] Header formatted for Contributor Agreement
// 0 !HISTORY 2008-07-01 [PTadmin] Official Update 2008-01
// 0 !HISTORY 2012-02-16 [Philo] Changed to CCW
// 0 !HISTORY 2012-03-30 [PTadmin] Official Update 2012-01
// 
// 
// 4 16 3.6956 1 1.5308 4.6195 0 1.9135 5 0 0 4 1 0
  [4,16,3.6956,1,1.5308,4.6195,0,1.9135,5,0,0,4,1,0],
// 4 16 2.8284 1 2.8284 3.5355 0 3.5355 4.6195 0 1.9135 3.6956 1 1.5308
  [4,16,2.8284,1,2.8284,3.5355,0,3.5355,4.6195,0,1.9135,3.6956,1,1.5308],
// 4 16 1.5308 1 3.6956 1.9135 0 4.6195 3.5355 0 3.5355 2.8284 1 2.8284
  [4,16,1.5308,1,3.6956,1.9135,0,4.6195,3.5355,0,3.5355,2.8284,1,2.8284],
// 4 16 0 1 4 0 0 5 1.9135 0 4.6195 1.5308 1 3.6956
  [4,16,0,1,4,0,0,5,1.9135,0,4.6195,1.5308,1,3.6956],
// 4 16 -1.5308 1 3.6956 -1.9135 0 4.6195 0 0 5 0 1 4
  [4,16,-1.5308,1,3.6956,-1.9135,0,4.6195,0,0,5,0,1,4],
// 4 16 -2.8284 1 2.8284 -3.5355 0 3.5355 -1.9135 0 4.6195 -1.5308 1 3.6956
  [4,16,-2.8284,1,2.8284,-3.5355,0,3.5355,-1.9135,0,4.6195,-1.5308,1,3.6956],
// 4 16 -3.6956 1 1.5308 -4.6195 0 1.9135 -3.5355 0 3.5355 -2.8284 1 2.8284
  [4,16,-3.6956,1,1.5308,-4.6195,0,1.9135,-3.5355,0,3.5355,-2.8284,1,2.8284],
// 4 16 -4 1 0 -5 0 0 -4.6195 0 1.9135 -3.6956 1 1.5308
  [4,16,-4,1,0,-5,0,0,-4.6195,0,1.9135,-3.6956,1,1.5308],
// 4 16 -3.6956 1 -1.5308 -4.6195 0 -1.9135 -5 0 0 -4 1 0
  [4,16,-3.6956,1,-1.5308,-4.6195,0,-1.9135,-5,0,0,-4,1,0],
// 4 16 -2.8284 1 -2.8284 -3.5355 0 -3.5355 -4.6195 0 -1.9135 -3.6956 1 -1.5308
  [4,16,-2.8284,1,-2.8284,-3.5355,0,-3.5355,-4.6195,0,-1.9135,-3.6956,1,-1.5308],
// 4 16 -1.5308 1 -3.6956 -1.9135 0 -4.6195 -3.5355 0 -3.5355 -2.8284 1 -2.8284
  [4,16,-1.5308,1,-3.6956,-1.9135,0,-4.6195,-3.5355,0,-3.5355,-2.8284,1,-2.8284],
// 4 16 0 1 -4 0 0 -5 -1.9135 0 -4.6195 -1.5308 1 -3.6956
  [4,16,0,1,-4,0,0,-5,-1.9135,0,-4.6195,-1.5308,1,-3.6956],
// 4 16 1.5308 1 -3.6956 1.9135 0 -4.6195 0 0 -5 0 1 -4
  [4,16,1.5308,1,-3.6956,1.9135,0,-4.6195,0,0,-5,0,1,-4],
// 4 16 2.8284 1 -2.8284 3.5355 0 -3.5355 1.9135 0 -4.6195 1.5308 1 -3.6956
  [4,16,2.8284,1,-2.8284,3.5355,0,-3.5355,1.9135,0,-4.6195,1.5308,1,-3.6956],
// 4 16 3.6956 1 -1.5308 4.6195 0 -1.9135 3.5355 0 -3.5355 2.8284 1 -2.8284
  [4,16,3.6956,1,-1.5308,4.6195,0,-1.9135,3.5355,0,-3.5355,2.8284,1,-2.8284],
// 4 16 4 1 0 5 0 0 4.6195 0 -1.9135 3.6956 1 -1.5308
  [4,16,4,1,0,5,0,0,4.6195,0,-1.9135,3.6956,1,-1.5308],
// 
// 5 24 4 1 0 5 0 0 3.6956 1 -1.5308 3.6956 1 1.5308
  [5,24,4,1,0,5,0,0,3.6956,1,-1.5308,3.6956,1,1.5308],
// 5 24 3.6956 1 1.5308 4.6195 0 1.9135 4 1 0 2.8284 1 2.8284
  [5,24,3.6956,1,1.5308,4.6195,0,1.9135,4,1,0,2.8284,1,2.8284],
// 5 24 2.8284 1 2.8284 3.5355 0 3.5355 3.6956 1 1.5308 1.5308 1 3.6956
  [5,24,2.8284,1,2.8284,3.5355,0,3.5355,3.6956,1,1.5308,1.5308,1,3.6956],
// 5 24 1.5308 1 3.6956 1.9135 0 4.6195 2.8284 1 2.8284 0 1 4
  [5,24,1.5308,1,3.6956,1.9135,0,4.6195,2.8284,1,2.8284,0,1,4],
// 5 24 0 1 4 0 0 5 1.5308 1 3.6956 -1.5308 1 3.6956
  [5,24,0,1,4,0,0,5,1.5308,1,3.6956,-1.5308,1,3.6956],
// 5 24 -1.5308 1 3.6956 -1.9135 0 4.6195 0 1 4 -2.8284 1 2.8284
  [5,24,-1.5308,1,3.6956,-1.9135,0,4.6195,0,1,4,-2.8284,1,2.8284],
// 5 24 -2.8284 1 2.8284 -3.5355 0 3.5355 -1.5308 1 3.6956 -3.6956 1 1.5308
  [5,24,-2.8284,1,2.8284,-3.5355,0,3.5355,-1.5308,1,3.6956,-3.6956,1,1.5308],
// 5 24 -3.6956 1 1.5308 -4.6195 0 1.9135 -2.8284 1 2.8284 -4 1 0
  [5,24,-3.6956,1,1.5308,-4.6195,0,1.9135,-2.8284,1,2.8284,-4,1,0],
// 5 24 -4 1 0 -5 0 0 -3.6956 1 1.5308 -3.6956 1 -1.5308
  [5,24,-4,1,0,-5,0,0,-3.6956,1,1.5308,-3.6956,1,-1.5308],
// 5 24 -3.6956 1 -1.5308 -4.6195 0 -1.9135 -4 1 0 -2.8284 1 -2.8284
  [5,24,-3.6956,1,-1.5308,-4.6195,0,-1.9135,-4,1,0,-2.8284,1,-2.8284],
// 5 24 -2.8284 1 -2.8284 -3.5355 0 -3.5355 -3.6956 1 -1.5308 -1.5308 1 -3.6956
  [5,24,-2.8284,1,-2.8284,-3.5355,0,-3.5355,-3.6956,1,-1.5308,-1.5308,1,-3.6956],
// 5 24 -1.5308 1 -3.6956 -1.9135 0 -4.6195 -2.8284 1 -2.8284 0 1 -4
  [5,24,-1.5308,1,-3.6956,-1.9135,0,-4.6195,-2.8284,1,-2.8284,0,1,-4],
// 5 24 0 1 -4 0 0 -5 -1.5308 1 -3.6956 1.5308 1 -3.6956
  [5,24,0,1,-4,0,0,-5,-1.5308,1,-3.6956,1.5308,1,-3.6956],
// 5 24 1.5308 1 -3.6956 1.9135 0 -4.6195 0 1 -4 2.8284 1 -2.8284
  [5,24,1.5308,1,-3.6956,1.9135,0,-4.6195,0,1,-4,2.8284,1,-2.8284],
// 5 24 2.8284 1 -2.8284 3.5355 0 -3.5355 1.5308 1 -3.6956 3.6956 1 -1.5308
  [5,24,2.8284,1,-2.8284,3.5355,0,-3.5355,1.5308,1,-3.6956,3.6956,1,-1.5308],
// 5 24 3.6956 1 -1.5308 4.6195 0 -1.9135 2.8284 1 -2.8284 4 1 0
  [5,24,3.6956,1,-1.5308,4.6195,0,-1.9135,2.8284,1,-2.8284,4,1,0],
];
module ldraw_lib__4_4con4(step=0, col=false, unit=2/5, alt=false, line=0.2, solid=!$preview)
    makepoly(ldraw_lib__4_4con4(solid), step=step, col=col, unit=unit, alt=alt, line=line, solid=solid);
ldraw_lib__4_4con4(line=0.2);
// main file
use <../lib.scad>
use <../p/4-4con4.scad>
use <../p/4-4cyli.scad>
use <../p/4-4edge.scad>
use <../p/4-4ring2.scad>
use <../p/4-4ring5.scad>
$fa=1; $fs=0.2;
function ldraw_lib__30028(realsolid=false) = [
// 0 Tyre  8/ 40 x  8 Slick Smooth
// 0 Name: 30028.dat
// 0 Author: Thomas Burger [grapeape]
// 0 !LDRAW_ORG Part UPDATE 2012-02
// 0 !LICENSE Licensed under CC BY 2.0 and CC BY 4.0 : see CAreadme.txt
// 
// 0 BFC CERTIFY CCW
  [0,"BFC","CERTIFY"],
  [0,"BFC","CCW"],
// 
// 0 !HISTORY 1998-02-12 [PTadmin] Official Update 1998-02
// 0 !HISTORY 2003-06-08 [jriley] BFC compliant, ring substitutions
// 0 !HISTORY 2004-04-22 [PTadmin] Official Update 2004-02
// 0 !HISTORY 2007-05-25 [PTadmin] Header formatted for Contributor Agreement
// 0 !HISTORY 2008-07-01 [PTadmin] Official Update 2008-01
// 0 !HISTORY 2012-04-29 [Steffen] added 4-4edge
// 0 !HISTORY 2012-08-09 [PTadmin] Official Update 2012-02
// 
// 
// 1 16 -5 0 0 0 1 0 10 0 0 0 0 10 4-4edge.dat
  [1,16,-5,0,0,0,1,0,10,0,0,0,0,10, ldraw_lib__4_4edge(realsolid)],
// 1 16 -5 0 0 0 1 0 18 0 0 0 0 18 4-4edge.dat
  [1,16,-5,0,0,0,1,0,18,0,0,0,0,18, ldraw_lib__4_4edge(realsolid)],
// 1 16 1 0 0 0 1 0 10 0 0 0 0 10 4-4edge.dat
  [1,16,1,0,0,0,1,0,10,0,0,0,0,10, ldraw_lib__4_4edge(realsolid)],
// 1 16 9 0 0 0 1 0 10 0 0 0 0 10 4-4edge.dat
  [1,16,9,0,0,0,1,0,10,0,0,0,0,10, ldraw_lib__4_4edge(realsolid)],
// 1 16 7 0 0 0 1 0 8 0 0 0 0 8 4-4edge.dat
  [1,16,7,0,0,0,1,0,8,0,0,0,0,8, ldraw_lib__4_4edge(realsolid)],
// 1 16 3 0 0 0 1 0 8 0 0 0 0 8 4-4edge.dat
  [1,16,3,0,0,0,1,0,8,0,0,0,0,8, ldraw_lib__4_4edge(realsolid)],
// 0 BFC INVERTNEXT
  [0,"BFC","INVERTNEXT"],
// 1 16 1 0 0 0 2 0 2 0 0 0 0 2 4-4con4.dat
  [1,16,1,0,0,0,2,0,2,0,0,0,0,2, ldraw_lib__4_4con4(realsolid)],
// 0 BFC INVERTNEXT
  [0,"BFC","INVERTNEXT"],
// 1 16 9 0 0 0 -2 0 2 0 0 0 0 2 4-4con4.dat
  [1,16,9,0,0,0,-2,0,2,0,0,0,0,2, ldraw_lib__4_4con4(realsolid)],
// 0 BFC INVERTNEXT
  [0,"BFC","INVERTNEXT"],
// 1 16 15 0 0 0 -6 0 10 0 0 0 0 10 4-4cyli.dat
  [1,16,15,0,0,0,-6,0,10,0,0,0,0,10, ldraw_lib__4_4cyli(realsolid)],
// 0 BFC INVERTNEXT
  [0,"BFC","INVERTNEXT"],
// 1 16 1 0 0 0 -6 0 10 0 0 0 0 10 4-4cyli.dat
  [1,16,1,0,0,0,-6,0,10,0,0,0,0,10, ldraw_lib__4_4cyli(realsolid)],
// 0 BFC INVERTNEXT
  [0,"BFC","INVERTNEXT"],
// 1 16 7 0 0 0 -4 0 8 0 0 0 0 8 4-4cyli.dat
  [1,16,7,0,0,0,-4,0,8,0,0,0,0,8, ldraw_lib__4_4cyli(realsolid)],
// 1 16 15 0 0 0 -20 0 18 0 0 0 0 18 4-4cyli.dat
  [1,16,15,0,0,0,-20,0,18,0,0,0,0,18, ldraw_lib__4_4cyli(realsolid)],
// 1 16 15 0 0 0 1 0 10 0 0 0 0 10 4-4edge.dat
  [1,16,15,0,0,0,1,0,10,0,0,0,0,10, ldraw_lib__4_4edge(realsolid)],
// 1 16 15 0 0 0 1 0 18 0 0 0 0 18 4-4edge.dat
  [1,16,15,0,0,0,1,0,18,0,0,0,0,18, ldraw_lib__4_4edge(realsolid)],
// 1 16 15 0 0 0 -1 0 5 0 0 0 0 -5 4-4ring2.dat
  [1,16,15,0,0,0,-1,0,5,0,0,0,0,-5, ldraw_lib__4_4ring2(realsolid)],
// 1 16 15 0 0 0 -1 0 3 0 0 0 0 -3 4-4ring5.dat
  [1,16,15,0,0,0,-1,0,3,0,0,0,0,-3, ldraw_lib__4_4ring5(realsolid)],
// 1 16 -5 0 0 0 1 0 5 0 0 0 0 5 4-4ring2.dat
  [1,16,-5,0,0,0,1,0,5,0,0,0,0,5, ldraw_lib__4_4ring2(realsolid)],
// 1 16 -5 0 0 0 1 0 3 0 0 0 0 3 4-4ring5.dat
  [1,16,-5,0,0,0,1,0,3,0,0,0,0,3, ldraw_lib__4_4ring5(realsolid)],
];
module ldraw_lib__30028(step=0, col=false, unit=2/5, alt=false, line=0.2, solid=!$preview)
    makepoly(ldraw_lib__30028(solid), step=step, col=col, unit=unit, alt=alt, line=line, solid=solid);
ldraw_lib__30028(line=0.2);
